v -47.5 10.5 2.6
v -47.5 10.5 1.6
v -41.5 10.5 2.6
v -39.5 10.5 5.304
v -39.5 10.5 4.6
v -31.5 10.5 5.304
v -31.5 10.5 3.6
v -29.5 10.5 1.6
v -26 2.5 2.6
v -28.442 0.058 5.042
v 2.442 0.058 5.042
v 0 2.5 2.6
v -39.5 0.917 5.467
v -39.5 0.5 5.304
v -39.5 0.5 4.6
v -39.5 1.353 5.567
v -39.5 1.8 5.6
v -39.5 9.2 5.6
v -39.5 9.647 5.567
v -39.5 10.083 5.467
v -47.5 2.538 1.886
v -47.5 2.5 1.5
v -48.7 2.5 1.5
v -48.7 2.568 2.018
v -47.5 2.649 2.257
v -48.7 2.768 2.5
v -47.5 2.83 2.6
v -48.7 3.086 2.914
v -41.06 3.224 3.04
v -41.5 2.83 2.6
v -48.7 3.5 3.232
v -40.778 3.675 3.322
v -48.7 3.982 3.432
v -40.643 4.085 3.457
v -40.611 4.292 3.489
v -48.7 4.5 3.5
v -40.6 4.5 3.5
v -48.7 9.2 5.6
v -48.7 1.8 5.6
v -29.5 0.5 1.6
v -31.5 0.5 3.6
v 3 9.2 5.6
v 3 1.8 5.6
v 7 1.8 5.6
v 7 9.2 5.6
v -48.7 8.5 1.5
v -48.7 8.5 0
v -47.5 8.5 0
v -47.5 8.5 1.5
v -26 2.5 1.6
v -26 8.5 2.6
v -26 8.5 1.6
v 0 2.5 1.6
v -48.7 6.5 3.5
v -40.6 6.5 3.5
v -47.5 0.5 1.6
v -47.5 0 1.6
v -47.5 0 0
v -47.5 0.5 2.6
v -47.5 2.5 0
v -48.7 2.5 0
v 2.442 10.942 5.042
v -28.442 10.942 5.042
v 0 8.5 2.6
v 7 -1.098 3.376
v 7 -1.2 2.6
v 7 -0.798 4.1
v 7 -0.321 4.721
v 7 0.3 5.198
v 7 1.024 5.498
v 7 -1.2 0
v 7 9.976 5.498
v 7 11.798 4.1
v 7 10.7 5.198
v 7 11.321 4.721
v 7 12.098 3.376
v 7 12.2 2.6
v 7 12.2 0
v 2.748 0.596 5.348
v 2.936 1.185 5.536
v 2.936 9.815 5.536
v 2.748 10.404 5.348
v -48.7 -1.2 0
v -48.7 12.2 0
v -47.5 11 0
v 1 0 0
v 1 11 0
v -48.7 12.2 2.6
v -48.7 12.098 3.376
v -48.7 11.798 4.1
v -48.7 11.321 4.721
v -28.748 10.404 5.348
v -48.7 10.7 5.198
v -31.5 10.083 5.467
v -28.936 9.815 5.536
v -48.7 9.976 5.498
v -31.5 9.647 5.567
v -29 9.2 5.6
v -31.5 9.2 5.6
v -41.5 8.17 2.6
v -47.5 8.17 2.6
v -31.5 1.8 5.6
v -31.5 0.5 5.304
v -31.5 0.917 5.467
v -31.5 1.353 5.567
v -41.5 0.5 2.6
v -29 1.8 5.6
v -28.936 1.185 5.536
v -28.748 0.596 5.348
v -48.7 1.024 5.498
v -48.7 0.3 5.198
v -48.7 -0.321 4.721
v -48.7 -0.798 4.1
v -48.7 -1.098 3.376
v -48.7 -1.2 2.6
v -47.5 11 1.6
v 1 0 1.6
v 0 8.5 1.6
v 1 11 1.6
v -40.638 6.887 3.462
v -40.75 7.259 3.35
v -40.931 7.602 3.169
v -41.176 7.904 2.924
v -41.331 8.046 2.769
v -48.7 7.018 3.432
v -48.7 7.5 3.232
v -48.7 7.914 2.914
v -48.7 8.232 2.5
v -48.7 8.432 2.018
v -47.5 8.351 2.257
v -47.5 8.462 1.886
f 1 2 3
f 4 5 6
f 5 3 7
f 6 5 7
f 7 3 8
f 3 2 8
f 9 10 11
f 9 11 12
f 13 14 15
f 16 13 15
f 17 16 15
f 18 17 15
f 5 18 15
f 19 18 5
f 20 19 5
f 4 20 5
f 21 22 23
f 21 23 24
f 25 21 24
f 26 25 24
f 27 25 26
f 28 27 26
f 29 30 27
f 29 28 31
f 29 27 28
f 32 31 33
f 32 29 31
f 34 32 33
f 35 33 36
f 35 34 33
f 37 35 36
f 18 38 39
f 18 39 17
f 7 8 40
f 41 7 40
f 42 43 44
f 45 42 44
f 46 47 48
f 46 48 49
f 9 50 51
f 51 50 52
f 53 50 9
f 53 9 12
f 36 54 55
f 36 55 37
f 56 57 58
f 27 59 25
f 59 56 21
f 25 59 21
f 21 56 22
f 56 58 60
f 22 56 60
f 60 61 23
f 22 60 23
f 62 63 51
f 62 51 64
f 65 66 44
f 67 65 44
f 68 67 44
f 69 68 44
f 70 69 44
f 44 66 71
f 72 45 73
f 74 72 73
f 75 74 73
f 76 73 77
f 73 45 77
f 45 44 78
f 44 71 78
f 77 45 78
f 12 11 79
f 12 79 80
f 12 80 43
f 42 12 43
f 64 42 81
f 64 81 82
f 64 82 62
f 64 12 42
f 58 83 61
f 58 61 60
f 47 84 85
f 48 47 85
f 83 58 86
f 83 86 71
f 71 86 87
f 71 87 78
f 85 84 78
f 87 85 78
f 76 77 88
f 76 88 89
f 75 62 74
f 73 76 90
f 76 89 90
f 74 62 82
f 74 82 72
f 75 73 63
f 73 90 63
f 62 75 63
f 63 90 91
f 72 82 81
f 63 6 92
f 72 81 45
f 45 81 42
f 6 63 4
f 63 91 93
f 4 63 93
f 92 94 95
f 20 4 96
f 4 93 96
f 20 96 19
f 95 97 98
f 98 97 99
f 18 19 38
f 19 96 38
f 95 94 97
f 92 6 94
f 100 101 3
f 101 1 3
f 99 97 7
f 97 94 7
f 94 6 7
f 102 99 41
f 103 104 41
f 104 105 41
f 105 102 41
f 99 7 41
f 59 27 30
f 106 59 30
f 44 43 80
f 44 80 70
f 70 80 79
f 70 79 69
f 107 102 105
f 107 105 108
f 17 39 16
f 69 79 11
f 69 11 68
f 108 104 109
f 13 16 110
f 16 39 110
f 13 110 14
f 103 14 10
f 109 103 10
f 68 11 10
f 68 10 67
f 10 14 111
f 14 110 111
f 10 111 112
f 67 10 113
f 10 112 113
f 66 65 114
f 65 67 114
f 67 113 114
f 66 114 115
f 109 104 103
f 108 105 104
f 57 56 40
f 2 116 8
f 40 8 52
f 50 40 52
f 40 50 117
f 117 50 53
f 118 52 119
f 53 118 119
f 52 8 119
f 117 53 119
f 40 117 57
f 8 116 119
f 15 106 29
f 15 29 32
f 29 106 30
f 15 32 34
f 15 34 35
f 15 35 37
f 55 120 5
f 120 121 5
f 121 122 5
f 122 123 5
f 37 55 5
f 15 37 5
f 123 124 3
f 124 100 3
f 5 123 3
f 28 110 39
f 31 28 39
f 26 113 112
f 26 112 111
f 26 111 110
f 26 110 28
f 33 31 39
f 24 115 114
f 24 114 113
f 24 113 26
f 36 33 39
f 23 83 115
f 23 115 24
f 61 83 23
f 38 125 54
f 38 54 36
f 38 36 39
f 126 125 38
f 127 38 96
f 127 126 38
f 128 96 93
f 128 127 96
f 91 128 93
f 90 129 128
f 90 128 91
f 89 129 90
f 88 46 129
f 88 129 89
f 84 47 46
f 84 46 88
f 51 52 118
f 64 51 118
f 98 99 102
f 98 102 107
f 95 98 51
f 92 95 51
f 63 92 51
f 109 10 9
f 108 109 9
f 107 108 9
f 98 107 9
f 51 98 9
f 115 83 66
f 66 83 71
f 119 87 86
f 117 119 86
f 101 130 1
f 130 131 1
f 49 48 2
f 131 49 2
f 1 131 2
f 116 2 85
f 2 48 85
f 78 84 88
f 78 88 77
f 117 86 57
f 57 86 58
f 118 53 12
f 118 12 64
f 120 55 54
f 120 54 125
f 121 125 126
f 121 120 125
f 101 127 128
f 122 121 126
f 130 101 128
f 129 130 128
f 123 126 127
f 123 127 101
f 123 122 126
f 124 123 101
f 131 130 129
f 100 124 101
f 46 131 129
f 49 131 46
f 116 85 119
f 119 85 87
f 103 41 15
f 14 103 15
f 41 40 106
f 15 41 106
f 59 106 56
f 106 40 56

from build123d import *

# Parameters (mm, degrees)
F0_W          = 55.7
F0_H          = 13.4
F1_DEPTH      = 1.6
F2_W          = 55.7
F2_H          = 13.4
F2_W_2        = 26
F2_H_2        = 6
F3_DEPTH      = 4
F4_W          = 8
F4_H          = 10
F5_DEPTH      = 3
F6_T1_DEPTH   = 70.7
F7_W          = 6
F7_H          = 3.5
F8_DEPTH      = 10
F9_R          = 2
F10_T4_DEPTH  = 21.4300979278
F10_T10_DEPTH = 41.4300979278
F10_T16_DEPTH = 41.4300979278
F10_T22_DEPTH = 21.4300979278
F11_C1_SIZE   = 2
F11_C2_SIZE   = 2


# Not quite as in the source:
# - a fillet or chamfer that OpenCascade refuses, or shapes differently, is made with other operations: its cross-section is extruded or revolved along the edge and cut away or added


with BuildPart() as f1:
    # F0 (on Top) → F1 (new body)
    with BuildSketch(Plane.XY):
        with Locations((-20.85, 5.5)):
            Rectangle(F0_W, F0_H)
        Polygon((1, 0), (0, 0), (-47.5, 0), (-47.5, 11), (0, 11), (1, 11), align=None, mode=Mode.SUBTRACT)
    extrude(amount=F1_DEPTH)

    # F2 (on face) → F3 (join)
    with BuildSketch(Plane.XY.offset(1.6)):
        with Locations((-20.85, 5.5)):
            Rectangle(F2_W, F2_H)
        Polygon((-47.5, 0.5), (-47.5, 10.5), (-47.5, 11), (1, 11), (1, 0), (-47.5, 0), align=None, mode=Mode.SUBTRACT)
        Polygon((-47.5, 11), (-47.5, 10.5), (-31.5, 10.5), (-31.5, 0.5), (-47.5, 0.5), (-47.5, 0), (1, 0), (1, 11), align=None)
        with Locations((-13, 5.5)):
            Rectangle(F2_W_2, F2_H_2, mode=Mode.SUBTRACT)
    extrude(amount=F3_DEPTH)

    # F4 (on face) → F5 (join)
    with BuildSketch(Plane.XY.offset(5.6)):
        Polygon((-39.5, 12.2), (-48.7, 12.2), (-48.7, -1.2), (-39.5, -1.2), (-39.5, 0.5), (-47.5, 0.5), (-47.5, 10.5), (-39.5, 10.5), align=None)
        with Locations((-43.5, 5.5)):
            Rectangle(F4_W, F4_H)
    extrude(amount=-F5_DEPTH)

    # F6: fillet of radius 3 on 2 edges, made by hand

    # F6_s2 → F6_t1 (cut)
    with BuildSketch(Plane.YZ.offset(-56.2)):
        with BuildLine():
            ThreePointArc((12.2, 2.6), (11.3213203436, 4.7213203436), (9.2, 5.6))
            Line((9.2, 5.6), (12.2, 5.6))
            Line((12.2, 5.6), (12.2, 2.6))
        make_face()
        with BuildLine():
            ThreePointArc((1.8, 5.6), (-0.3213203436, 4.7213203436), (-1.2, 2.6))
            Line((-1.2, 2.6), (-1.2, 5.6))
            Line((-1.2, 5.6), (1.8, 5.6))
        make_face()
    extrude(amount=F6_T1_DEPTH, mode=Mode.SUBTRACT)

    # F7 (on face) → F8 (cut)
    with BuildSketch(Plane(origin=(-48.7, 0, 0), x_dir=(0, -1, 0), z_dir=(-1, 0, 0))):
        with Locations((-5.5, 1.75)):
            Rectangle(F7_W, F7_H)
    extrude(amount=-F8_DEPTH, mode=Mode.SUBTRACT)

    # F9
    f9_edges = [f1.edges().sort_by_distance(p)[0] for p in [
        (-44.1, 8.5, 3.5),
        (-44.1, 2.5, 3.5),
    ]]
    fillet(f9_edges, radius=F9_R)

    # F10: chamfer of 3 on 4 edges, made by hand


with BuildPart() as f10_tool2:
    # F10_s3 → F10_t4 (new body)
    with BuildSketch(Plane.XZ.offset(5.2150489639)):
        Polygon((-29, 5.6), (-26, 2.6), (-26, 5.6), align=None)
    extrude(amount=-F10_T4_DEPTH)

    split(bisect_by=Plane(origin=(0, 2.55, 2.55), x_dir=(1, 0, 0), z_dir=(0, 0.7071067812, 0.7071067812)), keep=Keep.TOP)

    split(bisect_by=Plane(origin=(0, 2.95, -2.95), x_dir=(1, 0, 0), z_dir=(0, -0.7071067812, 0.7071067812)), keep=Keep.TOP)


with BuildPart() as f1_1:
    add(f1.part)

    # F10_t1: cut F10_tool2
    add(f10_tool2.part, mode=Mode.SUBTRACT)


with BuildPart() as f10_tool8:
    # F10_s9 → F10_t10 (new body)
    with BuildSketch(Plane.YZ.offset(-33.7150489639)):
        Polygon((11.5, 5.6), (8.5, 2.6), (8.5, 5.6), align=None)
    extrude(amount=F10_T10_DEPTH)

    split(bisect_by=Plane(origin=(-11.7, 0, -11.7), x_dir=(0, 1, 0), z_dir=(0.7071067812, 0, 0.7071067812)), keep=Keep.TOP)

    split(bisect_by=Plane(origin=(-1.3, 0, 1.3), x_dir=(0, 1, 0), z_dir=(-0.7071067812, 0, 0.7071067812)), keep=Keep.TOP)


with BuildPart() as f1_2:
    add(f1_1.part)

    # F10_t7: cut F10_tool8
    add(f10_tool8.part, mode=Mode.SUBTRACT)


with BuildPart() as f10_tool14:
    # F10_s15 → F10_t16 (new body)
    with BuildSketch(Plane.YZ.offset(7.7150489639)):
        Polygon((-0.5, 5.6), (2.5, 2.6), (2.5, 5.6), align=None)
    extrude(amount=-F10_T16_DEPTH)

    split(bisect_by=Plane(origin=(-11.7, 0, -11.7), x_dir=(0, 1, 0), z_dir=(0.7071067812, 0, 0.7071067812)), keep=Keep.TOP)

    split(bisect_by=Plane(origin=(-1.3, 0, 1.3), x_dir=(0, 1, 0), z_dir=(-0.7071067812, 0, 0.7071067812)), keep=Keep.TOP)


with BuildPart() as f1_3:
    add(f1_2.part)

    # F10_t13: cut F10_tool14
    add(f10_tool14.part, mode=Mode.SUBTRACT)


with BuildPart() as f10_tool20:
    # F10_s21 → F10_t22 (new body)
    with BuildSketch(Plane.XZ.offset(-16.2150489639)):
        Polygon((3, 5.6), (0, 2.6), (0, 5.6), align=None)
    extrude(amount=F10_T22_DEPTH)

    split(bisect_by=Plane(origin=(0, 2.55, 2.55), x_dir=(1, 0, 0), z_dir=(0, 0.7071067812, 0.7071067812)), keep=Keep.TOP)

    split(bisect_by=Plane(origin=(0, 2.95, -2.95), x_dir=(1, 0, 0), z_dir=(0, -0.7071067812, 0.7071067812)), keep=Keep.TOP)


with BuildPart() as f1_4:
    add(f1_3.part)

    # F10_t19: cut F10_tool20
    add(f10_tool20.part, mode=Mode.SUBTRACT)

    # F11: chamfer of 2 on 3 edges, made by hand

    # F11_c1
    f11_c1_edges = [f1_4.edges().sort_by_distance(p)[0] for p in [
        (-31.5, 5.5, 1.6),
    ]]
    chamfer(f11_c1_edges, length=F11_C1_SIZE)

    # F11_c2
    f11_c2_edges = [f1_4.edges().sort_by_distance(p)[0] for p in [
        (-39.5, 9.3351646544, 2.6),
    ]]
    chamfer(f11_c2_edges, length=F11_C2_SIZE)


solid = f1_4.part
